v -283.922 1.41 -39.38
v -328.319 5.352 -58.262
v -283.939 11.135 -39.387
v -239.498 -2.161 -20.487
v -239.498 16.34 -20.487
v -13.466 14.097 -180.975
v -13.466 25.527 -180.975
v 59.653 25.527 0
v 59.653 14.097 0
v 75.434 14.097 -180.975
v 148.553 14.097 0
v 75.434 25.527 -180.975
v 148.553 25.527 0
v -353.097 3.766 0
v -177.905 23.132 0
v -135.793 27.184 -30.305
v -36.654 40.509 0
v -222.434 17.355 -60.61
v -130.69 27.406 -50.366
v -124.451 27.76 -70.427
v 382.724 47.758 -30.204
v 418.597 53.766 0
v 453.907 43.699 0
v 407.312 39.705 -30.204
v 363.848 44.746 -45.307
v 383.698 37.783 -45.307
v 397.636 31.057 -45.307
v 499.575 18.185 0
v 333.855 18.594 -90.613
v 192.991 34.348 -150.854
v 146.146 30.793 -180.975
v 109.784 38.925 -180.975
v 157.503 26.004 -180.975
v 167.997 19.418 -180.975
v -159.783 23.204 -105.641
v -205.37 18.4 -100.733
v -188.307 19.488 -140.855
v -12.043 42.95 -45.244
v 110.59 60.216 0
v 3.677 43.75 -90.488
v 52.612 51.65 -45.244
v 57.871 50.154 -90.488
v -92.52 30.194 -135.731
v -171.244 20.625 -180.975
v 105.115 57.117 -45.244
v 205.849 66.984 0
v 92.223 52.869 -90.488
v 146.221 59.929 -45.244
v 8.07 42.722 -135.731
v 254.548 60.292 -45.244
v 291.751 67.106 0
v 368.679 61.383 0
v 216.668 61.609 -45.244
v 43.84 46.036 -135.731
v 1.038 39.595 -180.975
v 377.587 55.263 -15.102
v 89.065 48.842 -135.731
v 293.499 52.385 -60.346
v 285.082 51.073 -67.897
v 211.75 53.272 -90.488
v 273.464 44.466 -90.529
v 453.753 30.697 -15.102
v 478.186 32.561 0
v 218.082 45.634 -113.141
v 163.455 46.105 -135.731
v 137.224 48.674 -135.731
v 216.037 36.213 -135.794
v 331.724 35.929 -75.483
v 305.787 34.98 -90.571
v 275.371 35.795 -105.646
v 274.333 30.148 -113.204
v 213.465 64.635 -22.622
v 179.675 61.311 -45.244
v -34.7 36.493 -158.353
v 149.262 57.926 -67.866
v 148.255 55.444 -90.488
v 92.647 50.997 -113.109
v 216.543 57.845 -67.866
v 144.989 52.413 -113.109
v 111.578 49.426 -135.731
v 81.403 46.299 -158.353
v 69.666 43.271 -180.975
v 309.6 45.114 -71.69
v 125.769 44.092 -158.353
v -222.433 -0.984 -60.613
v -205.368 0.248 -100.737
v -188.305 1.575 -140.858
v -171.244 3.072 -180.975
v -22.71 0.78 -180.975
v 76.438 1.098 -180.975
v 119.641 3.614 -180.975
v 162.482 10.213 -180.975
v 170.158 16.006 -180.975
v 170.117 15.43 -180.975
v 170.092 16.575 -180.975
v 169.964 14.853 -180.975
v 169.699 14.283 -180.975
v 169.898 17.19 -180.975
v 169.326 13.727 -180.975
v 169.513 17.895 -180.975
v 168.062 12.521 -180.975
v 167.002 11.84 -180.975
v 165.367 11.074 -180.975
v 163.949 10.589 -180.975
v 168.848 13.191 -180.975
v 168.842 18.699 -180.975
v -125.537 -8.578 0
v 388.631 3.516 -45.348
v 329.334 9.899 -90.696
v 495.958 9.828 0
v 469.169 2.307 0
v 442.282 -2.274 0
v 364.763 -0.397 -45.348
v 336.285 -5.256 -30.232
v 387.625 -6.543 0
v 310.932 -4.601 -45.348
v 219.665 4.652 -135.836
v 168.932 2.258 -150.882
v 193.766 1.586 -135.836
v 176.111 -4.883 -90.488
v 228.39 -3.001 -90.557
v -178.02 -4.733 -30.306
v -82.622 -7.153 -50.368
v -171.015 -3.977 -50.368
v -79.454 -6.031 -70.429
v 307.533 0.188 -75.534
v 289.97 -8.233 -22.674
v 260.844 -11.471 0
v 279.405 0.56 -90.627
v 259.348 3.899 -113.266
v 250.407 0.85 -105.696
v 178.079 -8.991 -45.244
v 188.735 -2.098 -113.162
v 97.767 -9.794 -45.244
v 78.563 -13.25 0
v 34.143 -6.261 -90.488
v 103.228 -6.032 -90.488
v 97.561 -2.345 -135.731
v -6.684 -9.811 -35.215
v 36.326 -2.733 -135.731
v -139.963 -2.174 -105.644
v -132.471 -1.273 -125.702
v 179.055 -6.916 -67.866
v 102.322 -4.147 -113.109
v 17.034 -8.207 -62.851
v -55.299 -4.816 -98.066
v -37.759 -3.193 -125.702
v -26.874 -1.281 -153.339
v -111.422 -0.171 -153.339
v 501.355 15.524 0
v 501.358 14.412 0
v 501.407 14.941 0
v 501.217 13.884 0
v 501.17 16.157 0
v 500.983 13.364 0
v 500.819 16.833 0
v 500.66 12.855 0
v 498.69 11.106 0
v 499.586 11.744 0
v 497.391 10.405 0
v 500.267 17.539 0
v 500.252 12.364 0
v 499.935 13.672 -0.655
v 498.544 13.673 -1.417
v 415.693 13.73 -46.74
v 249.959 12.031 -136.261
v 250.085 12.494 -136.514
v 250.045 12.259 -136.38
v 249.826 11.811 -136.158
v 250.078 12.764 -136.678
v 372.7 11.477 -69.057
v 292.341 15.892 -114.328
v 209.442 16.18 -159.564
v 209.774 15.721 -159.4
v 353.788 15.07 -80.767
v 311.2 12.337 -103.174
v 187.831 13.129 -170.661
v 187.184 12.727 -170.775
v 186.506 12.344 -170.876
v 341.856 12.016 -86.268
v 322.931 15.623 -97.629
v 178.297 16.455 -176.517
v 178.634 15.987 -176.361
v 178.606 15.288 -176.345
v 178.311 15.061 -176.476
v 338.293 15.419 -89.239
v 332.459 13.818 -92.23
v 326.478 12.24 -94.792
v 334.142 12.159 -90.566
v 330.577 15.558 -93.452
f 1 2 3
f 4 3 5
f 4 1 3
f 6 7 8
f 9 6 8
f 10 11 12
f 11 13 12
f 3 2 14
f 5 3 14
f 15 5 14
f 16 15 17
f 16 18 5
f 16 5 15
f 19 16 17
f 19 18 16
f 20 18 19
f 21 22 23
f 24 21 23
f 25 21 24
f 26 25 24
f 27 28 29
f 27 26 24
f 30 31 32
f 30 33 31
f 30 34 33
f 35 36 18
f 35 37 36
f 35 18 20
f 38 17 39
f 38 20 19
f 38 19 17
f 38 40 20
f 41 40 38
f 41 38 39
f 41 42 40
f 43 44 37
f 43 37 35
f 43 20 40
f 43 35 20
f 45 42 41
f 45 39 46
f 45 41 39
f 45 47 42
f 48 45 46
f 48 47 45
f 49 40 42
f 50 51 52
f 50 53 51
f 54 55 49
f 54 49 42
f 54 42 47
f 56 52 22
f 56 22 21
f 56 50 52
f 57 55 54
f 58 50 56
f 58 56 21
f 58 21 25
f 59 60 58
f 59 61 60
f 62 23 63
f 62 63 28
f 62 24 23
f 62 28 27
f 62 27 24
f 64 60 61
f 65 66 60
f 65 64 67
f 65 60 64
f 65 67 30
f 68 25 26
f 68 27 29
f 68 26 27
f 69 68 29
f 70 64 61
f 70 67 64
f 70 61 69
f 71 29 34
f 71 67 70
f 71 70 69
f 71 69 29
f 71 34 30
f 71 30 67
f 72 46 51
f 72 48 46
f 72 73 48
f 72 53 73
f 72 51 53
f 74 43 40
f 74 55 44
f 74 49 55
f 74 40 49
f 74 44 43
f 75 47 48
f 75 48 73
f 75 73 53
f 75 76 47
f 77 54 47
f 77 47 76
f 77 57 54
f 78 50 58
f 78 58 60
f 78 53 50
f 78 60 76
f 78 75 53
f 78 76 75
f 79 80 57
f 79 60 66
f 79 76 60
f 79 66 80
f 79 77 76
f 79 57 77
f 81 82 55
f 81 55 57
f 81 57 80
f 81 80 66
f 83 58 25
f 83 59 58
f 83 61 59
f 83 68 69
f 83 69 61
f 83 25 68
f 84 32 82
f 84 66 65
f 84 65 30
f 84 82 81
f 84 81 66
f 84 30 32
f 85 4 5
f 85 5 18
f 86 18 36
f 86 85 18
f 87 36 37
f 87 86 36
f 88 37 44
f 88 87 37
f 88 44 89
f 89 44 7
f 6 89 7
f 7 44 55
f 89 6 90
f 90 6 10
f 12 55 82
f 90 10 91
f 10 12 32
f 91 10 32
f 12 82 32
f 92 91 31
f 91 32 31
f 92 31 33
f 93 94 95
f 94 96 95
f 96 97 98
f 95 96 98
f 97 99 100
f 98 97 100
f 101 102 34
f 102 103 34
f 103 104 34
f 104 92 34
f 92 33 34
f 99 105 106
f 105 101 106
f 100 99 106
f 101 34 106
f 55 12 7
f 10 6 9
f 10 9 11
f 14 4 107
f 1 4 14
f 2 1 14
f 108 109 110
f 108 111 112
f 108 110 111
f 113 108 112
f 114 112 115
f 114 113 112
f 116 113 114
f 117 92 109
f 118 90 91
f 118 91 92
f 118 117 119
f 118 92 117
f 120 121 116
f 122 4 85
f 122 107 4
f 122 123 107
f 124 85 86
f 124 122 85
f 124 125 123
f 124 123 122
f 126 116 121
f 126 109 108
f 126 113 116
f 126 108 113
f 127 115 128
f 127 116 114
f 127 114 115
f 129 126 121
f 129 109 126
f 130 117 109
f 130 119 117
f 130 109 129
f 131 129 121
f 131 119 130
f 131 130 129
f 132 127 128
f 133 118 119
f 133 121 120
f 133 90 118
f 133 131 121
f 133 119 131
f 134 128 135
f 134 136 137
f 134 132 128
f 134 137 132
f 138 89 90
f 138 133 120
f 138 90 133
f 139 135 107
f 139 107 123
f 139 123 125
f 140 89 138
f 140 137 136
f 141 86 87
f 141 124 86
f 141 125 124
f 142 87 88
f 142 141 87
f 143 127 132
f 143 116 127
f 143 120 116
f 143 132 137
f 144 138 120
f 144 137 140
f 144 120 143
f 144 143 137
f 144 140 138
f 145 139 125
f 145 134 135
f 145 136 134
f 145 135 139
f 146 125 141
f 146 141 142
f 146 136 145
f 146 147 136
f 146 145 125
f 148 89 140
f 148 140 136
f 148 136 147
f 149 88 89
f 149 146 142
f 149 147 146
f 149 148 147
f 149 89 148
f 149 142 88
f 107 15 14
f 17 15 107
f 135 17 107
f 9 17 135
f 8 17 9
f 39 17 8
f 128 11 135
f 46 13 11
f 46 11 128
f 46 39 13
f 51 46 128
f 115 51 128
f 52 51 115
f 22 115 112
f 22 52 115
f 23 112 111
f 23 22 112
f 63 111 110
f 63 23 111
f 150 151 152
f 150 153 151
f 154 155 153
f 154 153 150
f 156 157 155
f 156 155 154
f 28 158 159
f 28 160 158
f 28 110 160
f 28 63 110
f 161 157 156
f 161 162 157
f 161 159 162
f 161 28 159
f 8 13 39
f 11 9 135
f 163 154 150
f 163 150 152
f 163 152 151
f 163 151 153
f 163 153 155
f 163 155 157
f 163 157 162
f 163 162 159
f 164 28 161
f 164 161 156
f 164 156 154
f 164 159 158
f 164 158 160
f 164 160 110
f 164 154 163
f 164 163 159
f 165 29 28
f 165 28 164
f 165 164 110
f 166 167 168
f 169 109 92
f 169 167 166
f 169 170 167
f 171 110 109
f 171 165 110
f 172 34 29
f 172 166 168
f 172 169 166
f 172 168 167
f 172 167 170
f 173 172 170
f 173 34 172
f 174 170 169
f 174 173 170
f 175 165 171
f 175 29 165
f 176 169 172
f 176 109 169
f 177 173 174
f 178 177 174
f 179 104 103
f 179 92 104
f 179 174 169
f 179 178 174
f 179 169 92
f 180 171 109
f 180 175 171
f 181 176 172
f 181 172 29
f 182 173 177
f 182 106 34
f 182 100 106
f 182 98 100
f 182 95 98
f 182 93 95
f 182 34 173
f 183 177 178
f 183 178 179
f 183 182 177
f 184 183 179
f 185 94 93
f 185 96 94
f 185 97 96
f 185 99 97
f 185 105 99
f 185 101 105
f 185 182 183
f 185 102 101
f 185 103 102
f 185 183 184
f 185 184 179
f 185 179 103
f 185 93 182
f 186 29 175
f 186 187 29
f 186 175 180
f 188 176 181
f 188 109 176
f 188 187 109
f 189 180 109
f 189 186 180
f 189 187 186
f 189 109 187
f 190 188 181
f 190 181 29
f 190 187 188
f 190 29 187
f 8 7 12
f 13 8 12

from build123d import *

# Parameters (mm, degrees)
FILLET1_R               = 6.35
CUT_EXTRUDE1_DEPTH      = 5.715
CUT_EXTRUDE2_DEPTH      = 536.224800704
CUT_EXTRUDE2_DEPTH_BACK = 536.224800704


with BuildPart() as part:
    # Sketch1 → Loft1 section 0
    with BuildSketch(Plane.XY):
        with BuildLine():
            add(Edge.make_bspline(
                [(-353.097115344, 3.76640622), (-263.60988857, 15.489732087), (-103.405625954, 27.702523148), (139.625383809, 69.731889132), (320.600909148, 70.897971745), (447.029350736, 49.156772515), (484.461992977, 32.39779841), (505.225432444, 13.29140622)],
                knots=[0, 0, 0, 0, 0.308401543, 0.542913332, 0.850169973, 0.887176211, 1, 1, 1, 1], degree=3))
            add(Edge.make_bspline(
                [(-353.097115344, 3.76640622), (-171.204173065, -8.622681299), (70.681231732, -17.726989966), (367.634485174, -8.589262826), (467.934967897, -1.634661846), (505.225432444, 13.29140622)],
                knots=[0, 0, 0, 0, 0.625313044, 0.861778666, 1, 1, 1, 1], degree=3))
        make_face()
    # Sketch2 → Loft1 section 1
    with BuildSketch(Plane.XY.offset(-180.975)):
        with BuildLine():
            add(Edge.make_bspline(
                [(-276.130119323, 8.693130358), (-231.459725957, 13.892182525), (-160.606907467, 22.045765928), (-55.21857633, 32.848239562), (-5.484684229, 39.5878223), (20.294760191, 40.734135472), (52.215253795, 43.311195196), (77.433370096, 43.854837121), (107.657853328, 39.590984865), (131.131357877, 34.766526999), (149.499224412, 30.294140301), (163.418705178, 23.059137739), (171.530279946, 16.921852673), (175.269753602, 13.29140622)],
                knots=[0, 0, 0, 0, 0.247403676, 0.462108507, 0.504395118, 0.627983171, 0.653401948, 0.743134379, 0.818760812, 0.882434425, 0.924179622, 0.96050512, 1, 1, 1, 1], degree=3))
            add(Edge.make_bspline(
                [(-276.130119323, 8.693130358), (-174.260953063, 0.911239157), (-23.669401798, 0.683864032), (127.515095646, 0.681371654), (175.269753602, 13.29140622)],
                knots=[0, 0, 0, 0, 0.67646369, 1, 1, 1, 1], degree=3))
        make_face()
    loft()

    # Fillet1
    fillet1_edges = [part.edges().sort_by_distance(p)[0] for p in [
        (340.247593023, 13.29140622, -90.4875),
    ]]
    fillet(fillet1_edges, radius=FILLET1_R)

    # Sketch7 → Cut-Extrude1 (cut, symmetric)
    with BuildSketch(Plane(origin=(0, 19.812, 0), x_dir=(1, 0, 0), z_dir=(0, 1, 0))):
        Polygon((148.552884656, 0), (75.434238435, 180.975), (-13.465761565, 180.975), (59.652884656, 0), align=None)
    extrude(amount=CUT_EXTRUDE1_DEPTH, both=True, mode=Mode.SUBTRACT)

    # Sketch8 → Cut-Extrude2 (cut, two sides: drawn at the far end of the back side and taken through both)
    with BuildSketch(Plane(origin=(0, 19.812, 0), x_dir=(1, 0, 0), z_dir=(0, 1, 0)).offset(-CUT_EXTRUDE2_DEPTH_BACK)):
        Polygon((-328.318943928, 58.261720008), (-239.497903172, 20.486951723), (-171.243818501, 180.975), (-276.130119323, 180.975), align=None)
    extrude(amount=CUT_EXTRUDE2_DEPTH + CUT_EXTRUDE2_DEPTH_BACK, mode=Mode.SUBTRACT)


solid = part.part
